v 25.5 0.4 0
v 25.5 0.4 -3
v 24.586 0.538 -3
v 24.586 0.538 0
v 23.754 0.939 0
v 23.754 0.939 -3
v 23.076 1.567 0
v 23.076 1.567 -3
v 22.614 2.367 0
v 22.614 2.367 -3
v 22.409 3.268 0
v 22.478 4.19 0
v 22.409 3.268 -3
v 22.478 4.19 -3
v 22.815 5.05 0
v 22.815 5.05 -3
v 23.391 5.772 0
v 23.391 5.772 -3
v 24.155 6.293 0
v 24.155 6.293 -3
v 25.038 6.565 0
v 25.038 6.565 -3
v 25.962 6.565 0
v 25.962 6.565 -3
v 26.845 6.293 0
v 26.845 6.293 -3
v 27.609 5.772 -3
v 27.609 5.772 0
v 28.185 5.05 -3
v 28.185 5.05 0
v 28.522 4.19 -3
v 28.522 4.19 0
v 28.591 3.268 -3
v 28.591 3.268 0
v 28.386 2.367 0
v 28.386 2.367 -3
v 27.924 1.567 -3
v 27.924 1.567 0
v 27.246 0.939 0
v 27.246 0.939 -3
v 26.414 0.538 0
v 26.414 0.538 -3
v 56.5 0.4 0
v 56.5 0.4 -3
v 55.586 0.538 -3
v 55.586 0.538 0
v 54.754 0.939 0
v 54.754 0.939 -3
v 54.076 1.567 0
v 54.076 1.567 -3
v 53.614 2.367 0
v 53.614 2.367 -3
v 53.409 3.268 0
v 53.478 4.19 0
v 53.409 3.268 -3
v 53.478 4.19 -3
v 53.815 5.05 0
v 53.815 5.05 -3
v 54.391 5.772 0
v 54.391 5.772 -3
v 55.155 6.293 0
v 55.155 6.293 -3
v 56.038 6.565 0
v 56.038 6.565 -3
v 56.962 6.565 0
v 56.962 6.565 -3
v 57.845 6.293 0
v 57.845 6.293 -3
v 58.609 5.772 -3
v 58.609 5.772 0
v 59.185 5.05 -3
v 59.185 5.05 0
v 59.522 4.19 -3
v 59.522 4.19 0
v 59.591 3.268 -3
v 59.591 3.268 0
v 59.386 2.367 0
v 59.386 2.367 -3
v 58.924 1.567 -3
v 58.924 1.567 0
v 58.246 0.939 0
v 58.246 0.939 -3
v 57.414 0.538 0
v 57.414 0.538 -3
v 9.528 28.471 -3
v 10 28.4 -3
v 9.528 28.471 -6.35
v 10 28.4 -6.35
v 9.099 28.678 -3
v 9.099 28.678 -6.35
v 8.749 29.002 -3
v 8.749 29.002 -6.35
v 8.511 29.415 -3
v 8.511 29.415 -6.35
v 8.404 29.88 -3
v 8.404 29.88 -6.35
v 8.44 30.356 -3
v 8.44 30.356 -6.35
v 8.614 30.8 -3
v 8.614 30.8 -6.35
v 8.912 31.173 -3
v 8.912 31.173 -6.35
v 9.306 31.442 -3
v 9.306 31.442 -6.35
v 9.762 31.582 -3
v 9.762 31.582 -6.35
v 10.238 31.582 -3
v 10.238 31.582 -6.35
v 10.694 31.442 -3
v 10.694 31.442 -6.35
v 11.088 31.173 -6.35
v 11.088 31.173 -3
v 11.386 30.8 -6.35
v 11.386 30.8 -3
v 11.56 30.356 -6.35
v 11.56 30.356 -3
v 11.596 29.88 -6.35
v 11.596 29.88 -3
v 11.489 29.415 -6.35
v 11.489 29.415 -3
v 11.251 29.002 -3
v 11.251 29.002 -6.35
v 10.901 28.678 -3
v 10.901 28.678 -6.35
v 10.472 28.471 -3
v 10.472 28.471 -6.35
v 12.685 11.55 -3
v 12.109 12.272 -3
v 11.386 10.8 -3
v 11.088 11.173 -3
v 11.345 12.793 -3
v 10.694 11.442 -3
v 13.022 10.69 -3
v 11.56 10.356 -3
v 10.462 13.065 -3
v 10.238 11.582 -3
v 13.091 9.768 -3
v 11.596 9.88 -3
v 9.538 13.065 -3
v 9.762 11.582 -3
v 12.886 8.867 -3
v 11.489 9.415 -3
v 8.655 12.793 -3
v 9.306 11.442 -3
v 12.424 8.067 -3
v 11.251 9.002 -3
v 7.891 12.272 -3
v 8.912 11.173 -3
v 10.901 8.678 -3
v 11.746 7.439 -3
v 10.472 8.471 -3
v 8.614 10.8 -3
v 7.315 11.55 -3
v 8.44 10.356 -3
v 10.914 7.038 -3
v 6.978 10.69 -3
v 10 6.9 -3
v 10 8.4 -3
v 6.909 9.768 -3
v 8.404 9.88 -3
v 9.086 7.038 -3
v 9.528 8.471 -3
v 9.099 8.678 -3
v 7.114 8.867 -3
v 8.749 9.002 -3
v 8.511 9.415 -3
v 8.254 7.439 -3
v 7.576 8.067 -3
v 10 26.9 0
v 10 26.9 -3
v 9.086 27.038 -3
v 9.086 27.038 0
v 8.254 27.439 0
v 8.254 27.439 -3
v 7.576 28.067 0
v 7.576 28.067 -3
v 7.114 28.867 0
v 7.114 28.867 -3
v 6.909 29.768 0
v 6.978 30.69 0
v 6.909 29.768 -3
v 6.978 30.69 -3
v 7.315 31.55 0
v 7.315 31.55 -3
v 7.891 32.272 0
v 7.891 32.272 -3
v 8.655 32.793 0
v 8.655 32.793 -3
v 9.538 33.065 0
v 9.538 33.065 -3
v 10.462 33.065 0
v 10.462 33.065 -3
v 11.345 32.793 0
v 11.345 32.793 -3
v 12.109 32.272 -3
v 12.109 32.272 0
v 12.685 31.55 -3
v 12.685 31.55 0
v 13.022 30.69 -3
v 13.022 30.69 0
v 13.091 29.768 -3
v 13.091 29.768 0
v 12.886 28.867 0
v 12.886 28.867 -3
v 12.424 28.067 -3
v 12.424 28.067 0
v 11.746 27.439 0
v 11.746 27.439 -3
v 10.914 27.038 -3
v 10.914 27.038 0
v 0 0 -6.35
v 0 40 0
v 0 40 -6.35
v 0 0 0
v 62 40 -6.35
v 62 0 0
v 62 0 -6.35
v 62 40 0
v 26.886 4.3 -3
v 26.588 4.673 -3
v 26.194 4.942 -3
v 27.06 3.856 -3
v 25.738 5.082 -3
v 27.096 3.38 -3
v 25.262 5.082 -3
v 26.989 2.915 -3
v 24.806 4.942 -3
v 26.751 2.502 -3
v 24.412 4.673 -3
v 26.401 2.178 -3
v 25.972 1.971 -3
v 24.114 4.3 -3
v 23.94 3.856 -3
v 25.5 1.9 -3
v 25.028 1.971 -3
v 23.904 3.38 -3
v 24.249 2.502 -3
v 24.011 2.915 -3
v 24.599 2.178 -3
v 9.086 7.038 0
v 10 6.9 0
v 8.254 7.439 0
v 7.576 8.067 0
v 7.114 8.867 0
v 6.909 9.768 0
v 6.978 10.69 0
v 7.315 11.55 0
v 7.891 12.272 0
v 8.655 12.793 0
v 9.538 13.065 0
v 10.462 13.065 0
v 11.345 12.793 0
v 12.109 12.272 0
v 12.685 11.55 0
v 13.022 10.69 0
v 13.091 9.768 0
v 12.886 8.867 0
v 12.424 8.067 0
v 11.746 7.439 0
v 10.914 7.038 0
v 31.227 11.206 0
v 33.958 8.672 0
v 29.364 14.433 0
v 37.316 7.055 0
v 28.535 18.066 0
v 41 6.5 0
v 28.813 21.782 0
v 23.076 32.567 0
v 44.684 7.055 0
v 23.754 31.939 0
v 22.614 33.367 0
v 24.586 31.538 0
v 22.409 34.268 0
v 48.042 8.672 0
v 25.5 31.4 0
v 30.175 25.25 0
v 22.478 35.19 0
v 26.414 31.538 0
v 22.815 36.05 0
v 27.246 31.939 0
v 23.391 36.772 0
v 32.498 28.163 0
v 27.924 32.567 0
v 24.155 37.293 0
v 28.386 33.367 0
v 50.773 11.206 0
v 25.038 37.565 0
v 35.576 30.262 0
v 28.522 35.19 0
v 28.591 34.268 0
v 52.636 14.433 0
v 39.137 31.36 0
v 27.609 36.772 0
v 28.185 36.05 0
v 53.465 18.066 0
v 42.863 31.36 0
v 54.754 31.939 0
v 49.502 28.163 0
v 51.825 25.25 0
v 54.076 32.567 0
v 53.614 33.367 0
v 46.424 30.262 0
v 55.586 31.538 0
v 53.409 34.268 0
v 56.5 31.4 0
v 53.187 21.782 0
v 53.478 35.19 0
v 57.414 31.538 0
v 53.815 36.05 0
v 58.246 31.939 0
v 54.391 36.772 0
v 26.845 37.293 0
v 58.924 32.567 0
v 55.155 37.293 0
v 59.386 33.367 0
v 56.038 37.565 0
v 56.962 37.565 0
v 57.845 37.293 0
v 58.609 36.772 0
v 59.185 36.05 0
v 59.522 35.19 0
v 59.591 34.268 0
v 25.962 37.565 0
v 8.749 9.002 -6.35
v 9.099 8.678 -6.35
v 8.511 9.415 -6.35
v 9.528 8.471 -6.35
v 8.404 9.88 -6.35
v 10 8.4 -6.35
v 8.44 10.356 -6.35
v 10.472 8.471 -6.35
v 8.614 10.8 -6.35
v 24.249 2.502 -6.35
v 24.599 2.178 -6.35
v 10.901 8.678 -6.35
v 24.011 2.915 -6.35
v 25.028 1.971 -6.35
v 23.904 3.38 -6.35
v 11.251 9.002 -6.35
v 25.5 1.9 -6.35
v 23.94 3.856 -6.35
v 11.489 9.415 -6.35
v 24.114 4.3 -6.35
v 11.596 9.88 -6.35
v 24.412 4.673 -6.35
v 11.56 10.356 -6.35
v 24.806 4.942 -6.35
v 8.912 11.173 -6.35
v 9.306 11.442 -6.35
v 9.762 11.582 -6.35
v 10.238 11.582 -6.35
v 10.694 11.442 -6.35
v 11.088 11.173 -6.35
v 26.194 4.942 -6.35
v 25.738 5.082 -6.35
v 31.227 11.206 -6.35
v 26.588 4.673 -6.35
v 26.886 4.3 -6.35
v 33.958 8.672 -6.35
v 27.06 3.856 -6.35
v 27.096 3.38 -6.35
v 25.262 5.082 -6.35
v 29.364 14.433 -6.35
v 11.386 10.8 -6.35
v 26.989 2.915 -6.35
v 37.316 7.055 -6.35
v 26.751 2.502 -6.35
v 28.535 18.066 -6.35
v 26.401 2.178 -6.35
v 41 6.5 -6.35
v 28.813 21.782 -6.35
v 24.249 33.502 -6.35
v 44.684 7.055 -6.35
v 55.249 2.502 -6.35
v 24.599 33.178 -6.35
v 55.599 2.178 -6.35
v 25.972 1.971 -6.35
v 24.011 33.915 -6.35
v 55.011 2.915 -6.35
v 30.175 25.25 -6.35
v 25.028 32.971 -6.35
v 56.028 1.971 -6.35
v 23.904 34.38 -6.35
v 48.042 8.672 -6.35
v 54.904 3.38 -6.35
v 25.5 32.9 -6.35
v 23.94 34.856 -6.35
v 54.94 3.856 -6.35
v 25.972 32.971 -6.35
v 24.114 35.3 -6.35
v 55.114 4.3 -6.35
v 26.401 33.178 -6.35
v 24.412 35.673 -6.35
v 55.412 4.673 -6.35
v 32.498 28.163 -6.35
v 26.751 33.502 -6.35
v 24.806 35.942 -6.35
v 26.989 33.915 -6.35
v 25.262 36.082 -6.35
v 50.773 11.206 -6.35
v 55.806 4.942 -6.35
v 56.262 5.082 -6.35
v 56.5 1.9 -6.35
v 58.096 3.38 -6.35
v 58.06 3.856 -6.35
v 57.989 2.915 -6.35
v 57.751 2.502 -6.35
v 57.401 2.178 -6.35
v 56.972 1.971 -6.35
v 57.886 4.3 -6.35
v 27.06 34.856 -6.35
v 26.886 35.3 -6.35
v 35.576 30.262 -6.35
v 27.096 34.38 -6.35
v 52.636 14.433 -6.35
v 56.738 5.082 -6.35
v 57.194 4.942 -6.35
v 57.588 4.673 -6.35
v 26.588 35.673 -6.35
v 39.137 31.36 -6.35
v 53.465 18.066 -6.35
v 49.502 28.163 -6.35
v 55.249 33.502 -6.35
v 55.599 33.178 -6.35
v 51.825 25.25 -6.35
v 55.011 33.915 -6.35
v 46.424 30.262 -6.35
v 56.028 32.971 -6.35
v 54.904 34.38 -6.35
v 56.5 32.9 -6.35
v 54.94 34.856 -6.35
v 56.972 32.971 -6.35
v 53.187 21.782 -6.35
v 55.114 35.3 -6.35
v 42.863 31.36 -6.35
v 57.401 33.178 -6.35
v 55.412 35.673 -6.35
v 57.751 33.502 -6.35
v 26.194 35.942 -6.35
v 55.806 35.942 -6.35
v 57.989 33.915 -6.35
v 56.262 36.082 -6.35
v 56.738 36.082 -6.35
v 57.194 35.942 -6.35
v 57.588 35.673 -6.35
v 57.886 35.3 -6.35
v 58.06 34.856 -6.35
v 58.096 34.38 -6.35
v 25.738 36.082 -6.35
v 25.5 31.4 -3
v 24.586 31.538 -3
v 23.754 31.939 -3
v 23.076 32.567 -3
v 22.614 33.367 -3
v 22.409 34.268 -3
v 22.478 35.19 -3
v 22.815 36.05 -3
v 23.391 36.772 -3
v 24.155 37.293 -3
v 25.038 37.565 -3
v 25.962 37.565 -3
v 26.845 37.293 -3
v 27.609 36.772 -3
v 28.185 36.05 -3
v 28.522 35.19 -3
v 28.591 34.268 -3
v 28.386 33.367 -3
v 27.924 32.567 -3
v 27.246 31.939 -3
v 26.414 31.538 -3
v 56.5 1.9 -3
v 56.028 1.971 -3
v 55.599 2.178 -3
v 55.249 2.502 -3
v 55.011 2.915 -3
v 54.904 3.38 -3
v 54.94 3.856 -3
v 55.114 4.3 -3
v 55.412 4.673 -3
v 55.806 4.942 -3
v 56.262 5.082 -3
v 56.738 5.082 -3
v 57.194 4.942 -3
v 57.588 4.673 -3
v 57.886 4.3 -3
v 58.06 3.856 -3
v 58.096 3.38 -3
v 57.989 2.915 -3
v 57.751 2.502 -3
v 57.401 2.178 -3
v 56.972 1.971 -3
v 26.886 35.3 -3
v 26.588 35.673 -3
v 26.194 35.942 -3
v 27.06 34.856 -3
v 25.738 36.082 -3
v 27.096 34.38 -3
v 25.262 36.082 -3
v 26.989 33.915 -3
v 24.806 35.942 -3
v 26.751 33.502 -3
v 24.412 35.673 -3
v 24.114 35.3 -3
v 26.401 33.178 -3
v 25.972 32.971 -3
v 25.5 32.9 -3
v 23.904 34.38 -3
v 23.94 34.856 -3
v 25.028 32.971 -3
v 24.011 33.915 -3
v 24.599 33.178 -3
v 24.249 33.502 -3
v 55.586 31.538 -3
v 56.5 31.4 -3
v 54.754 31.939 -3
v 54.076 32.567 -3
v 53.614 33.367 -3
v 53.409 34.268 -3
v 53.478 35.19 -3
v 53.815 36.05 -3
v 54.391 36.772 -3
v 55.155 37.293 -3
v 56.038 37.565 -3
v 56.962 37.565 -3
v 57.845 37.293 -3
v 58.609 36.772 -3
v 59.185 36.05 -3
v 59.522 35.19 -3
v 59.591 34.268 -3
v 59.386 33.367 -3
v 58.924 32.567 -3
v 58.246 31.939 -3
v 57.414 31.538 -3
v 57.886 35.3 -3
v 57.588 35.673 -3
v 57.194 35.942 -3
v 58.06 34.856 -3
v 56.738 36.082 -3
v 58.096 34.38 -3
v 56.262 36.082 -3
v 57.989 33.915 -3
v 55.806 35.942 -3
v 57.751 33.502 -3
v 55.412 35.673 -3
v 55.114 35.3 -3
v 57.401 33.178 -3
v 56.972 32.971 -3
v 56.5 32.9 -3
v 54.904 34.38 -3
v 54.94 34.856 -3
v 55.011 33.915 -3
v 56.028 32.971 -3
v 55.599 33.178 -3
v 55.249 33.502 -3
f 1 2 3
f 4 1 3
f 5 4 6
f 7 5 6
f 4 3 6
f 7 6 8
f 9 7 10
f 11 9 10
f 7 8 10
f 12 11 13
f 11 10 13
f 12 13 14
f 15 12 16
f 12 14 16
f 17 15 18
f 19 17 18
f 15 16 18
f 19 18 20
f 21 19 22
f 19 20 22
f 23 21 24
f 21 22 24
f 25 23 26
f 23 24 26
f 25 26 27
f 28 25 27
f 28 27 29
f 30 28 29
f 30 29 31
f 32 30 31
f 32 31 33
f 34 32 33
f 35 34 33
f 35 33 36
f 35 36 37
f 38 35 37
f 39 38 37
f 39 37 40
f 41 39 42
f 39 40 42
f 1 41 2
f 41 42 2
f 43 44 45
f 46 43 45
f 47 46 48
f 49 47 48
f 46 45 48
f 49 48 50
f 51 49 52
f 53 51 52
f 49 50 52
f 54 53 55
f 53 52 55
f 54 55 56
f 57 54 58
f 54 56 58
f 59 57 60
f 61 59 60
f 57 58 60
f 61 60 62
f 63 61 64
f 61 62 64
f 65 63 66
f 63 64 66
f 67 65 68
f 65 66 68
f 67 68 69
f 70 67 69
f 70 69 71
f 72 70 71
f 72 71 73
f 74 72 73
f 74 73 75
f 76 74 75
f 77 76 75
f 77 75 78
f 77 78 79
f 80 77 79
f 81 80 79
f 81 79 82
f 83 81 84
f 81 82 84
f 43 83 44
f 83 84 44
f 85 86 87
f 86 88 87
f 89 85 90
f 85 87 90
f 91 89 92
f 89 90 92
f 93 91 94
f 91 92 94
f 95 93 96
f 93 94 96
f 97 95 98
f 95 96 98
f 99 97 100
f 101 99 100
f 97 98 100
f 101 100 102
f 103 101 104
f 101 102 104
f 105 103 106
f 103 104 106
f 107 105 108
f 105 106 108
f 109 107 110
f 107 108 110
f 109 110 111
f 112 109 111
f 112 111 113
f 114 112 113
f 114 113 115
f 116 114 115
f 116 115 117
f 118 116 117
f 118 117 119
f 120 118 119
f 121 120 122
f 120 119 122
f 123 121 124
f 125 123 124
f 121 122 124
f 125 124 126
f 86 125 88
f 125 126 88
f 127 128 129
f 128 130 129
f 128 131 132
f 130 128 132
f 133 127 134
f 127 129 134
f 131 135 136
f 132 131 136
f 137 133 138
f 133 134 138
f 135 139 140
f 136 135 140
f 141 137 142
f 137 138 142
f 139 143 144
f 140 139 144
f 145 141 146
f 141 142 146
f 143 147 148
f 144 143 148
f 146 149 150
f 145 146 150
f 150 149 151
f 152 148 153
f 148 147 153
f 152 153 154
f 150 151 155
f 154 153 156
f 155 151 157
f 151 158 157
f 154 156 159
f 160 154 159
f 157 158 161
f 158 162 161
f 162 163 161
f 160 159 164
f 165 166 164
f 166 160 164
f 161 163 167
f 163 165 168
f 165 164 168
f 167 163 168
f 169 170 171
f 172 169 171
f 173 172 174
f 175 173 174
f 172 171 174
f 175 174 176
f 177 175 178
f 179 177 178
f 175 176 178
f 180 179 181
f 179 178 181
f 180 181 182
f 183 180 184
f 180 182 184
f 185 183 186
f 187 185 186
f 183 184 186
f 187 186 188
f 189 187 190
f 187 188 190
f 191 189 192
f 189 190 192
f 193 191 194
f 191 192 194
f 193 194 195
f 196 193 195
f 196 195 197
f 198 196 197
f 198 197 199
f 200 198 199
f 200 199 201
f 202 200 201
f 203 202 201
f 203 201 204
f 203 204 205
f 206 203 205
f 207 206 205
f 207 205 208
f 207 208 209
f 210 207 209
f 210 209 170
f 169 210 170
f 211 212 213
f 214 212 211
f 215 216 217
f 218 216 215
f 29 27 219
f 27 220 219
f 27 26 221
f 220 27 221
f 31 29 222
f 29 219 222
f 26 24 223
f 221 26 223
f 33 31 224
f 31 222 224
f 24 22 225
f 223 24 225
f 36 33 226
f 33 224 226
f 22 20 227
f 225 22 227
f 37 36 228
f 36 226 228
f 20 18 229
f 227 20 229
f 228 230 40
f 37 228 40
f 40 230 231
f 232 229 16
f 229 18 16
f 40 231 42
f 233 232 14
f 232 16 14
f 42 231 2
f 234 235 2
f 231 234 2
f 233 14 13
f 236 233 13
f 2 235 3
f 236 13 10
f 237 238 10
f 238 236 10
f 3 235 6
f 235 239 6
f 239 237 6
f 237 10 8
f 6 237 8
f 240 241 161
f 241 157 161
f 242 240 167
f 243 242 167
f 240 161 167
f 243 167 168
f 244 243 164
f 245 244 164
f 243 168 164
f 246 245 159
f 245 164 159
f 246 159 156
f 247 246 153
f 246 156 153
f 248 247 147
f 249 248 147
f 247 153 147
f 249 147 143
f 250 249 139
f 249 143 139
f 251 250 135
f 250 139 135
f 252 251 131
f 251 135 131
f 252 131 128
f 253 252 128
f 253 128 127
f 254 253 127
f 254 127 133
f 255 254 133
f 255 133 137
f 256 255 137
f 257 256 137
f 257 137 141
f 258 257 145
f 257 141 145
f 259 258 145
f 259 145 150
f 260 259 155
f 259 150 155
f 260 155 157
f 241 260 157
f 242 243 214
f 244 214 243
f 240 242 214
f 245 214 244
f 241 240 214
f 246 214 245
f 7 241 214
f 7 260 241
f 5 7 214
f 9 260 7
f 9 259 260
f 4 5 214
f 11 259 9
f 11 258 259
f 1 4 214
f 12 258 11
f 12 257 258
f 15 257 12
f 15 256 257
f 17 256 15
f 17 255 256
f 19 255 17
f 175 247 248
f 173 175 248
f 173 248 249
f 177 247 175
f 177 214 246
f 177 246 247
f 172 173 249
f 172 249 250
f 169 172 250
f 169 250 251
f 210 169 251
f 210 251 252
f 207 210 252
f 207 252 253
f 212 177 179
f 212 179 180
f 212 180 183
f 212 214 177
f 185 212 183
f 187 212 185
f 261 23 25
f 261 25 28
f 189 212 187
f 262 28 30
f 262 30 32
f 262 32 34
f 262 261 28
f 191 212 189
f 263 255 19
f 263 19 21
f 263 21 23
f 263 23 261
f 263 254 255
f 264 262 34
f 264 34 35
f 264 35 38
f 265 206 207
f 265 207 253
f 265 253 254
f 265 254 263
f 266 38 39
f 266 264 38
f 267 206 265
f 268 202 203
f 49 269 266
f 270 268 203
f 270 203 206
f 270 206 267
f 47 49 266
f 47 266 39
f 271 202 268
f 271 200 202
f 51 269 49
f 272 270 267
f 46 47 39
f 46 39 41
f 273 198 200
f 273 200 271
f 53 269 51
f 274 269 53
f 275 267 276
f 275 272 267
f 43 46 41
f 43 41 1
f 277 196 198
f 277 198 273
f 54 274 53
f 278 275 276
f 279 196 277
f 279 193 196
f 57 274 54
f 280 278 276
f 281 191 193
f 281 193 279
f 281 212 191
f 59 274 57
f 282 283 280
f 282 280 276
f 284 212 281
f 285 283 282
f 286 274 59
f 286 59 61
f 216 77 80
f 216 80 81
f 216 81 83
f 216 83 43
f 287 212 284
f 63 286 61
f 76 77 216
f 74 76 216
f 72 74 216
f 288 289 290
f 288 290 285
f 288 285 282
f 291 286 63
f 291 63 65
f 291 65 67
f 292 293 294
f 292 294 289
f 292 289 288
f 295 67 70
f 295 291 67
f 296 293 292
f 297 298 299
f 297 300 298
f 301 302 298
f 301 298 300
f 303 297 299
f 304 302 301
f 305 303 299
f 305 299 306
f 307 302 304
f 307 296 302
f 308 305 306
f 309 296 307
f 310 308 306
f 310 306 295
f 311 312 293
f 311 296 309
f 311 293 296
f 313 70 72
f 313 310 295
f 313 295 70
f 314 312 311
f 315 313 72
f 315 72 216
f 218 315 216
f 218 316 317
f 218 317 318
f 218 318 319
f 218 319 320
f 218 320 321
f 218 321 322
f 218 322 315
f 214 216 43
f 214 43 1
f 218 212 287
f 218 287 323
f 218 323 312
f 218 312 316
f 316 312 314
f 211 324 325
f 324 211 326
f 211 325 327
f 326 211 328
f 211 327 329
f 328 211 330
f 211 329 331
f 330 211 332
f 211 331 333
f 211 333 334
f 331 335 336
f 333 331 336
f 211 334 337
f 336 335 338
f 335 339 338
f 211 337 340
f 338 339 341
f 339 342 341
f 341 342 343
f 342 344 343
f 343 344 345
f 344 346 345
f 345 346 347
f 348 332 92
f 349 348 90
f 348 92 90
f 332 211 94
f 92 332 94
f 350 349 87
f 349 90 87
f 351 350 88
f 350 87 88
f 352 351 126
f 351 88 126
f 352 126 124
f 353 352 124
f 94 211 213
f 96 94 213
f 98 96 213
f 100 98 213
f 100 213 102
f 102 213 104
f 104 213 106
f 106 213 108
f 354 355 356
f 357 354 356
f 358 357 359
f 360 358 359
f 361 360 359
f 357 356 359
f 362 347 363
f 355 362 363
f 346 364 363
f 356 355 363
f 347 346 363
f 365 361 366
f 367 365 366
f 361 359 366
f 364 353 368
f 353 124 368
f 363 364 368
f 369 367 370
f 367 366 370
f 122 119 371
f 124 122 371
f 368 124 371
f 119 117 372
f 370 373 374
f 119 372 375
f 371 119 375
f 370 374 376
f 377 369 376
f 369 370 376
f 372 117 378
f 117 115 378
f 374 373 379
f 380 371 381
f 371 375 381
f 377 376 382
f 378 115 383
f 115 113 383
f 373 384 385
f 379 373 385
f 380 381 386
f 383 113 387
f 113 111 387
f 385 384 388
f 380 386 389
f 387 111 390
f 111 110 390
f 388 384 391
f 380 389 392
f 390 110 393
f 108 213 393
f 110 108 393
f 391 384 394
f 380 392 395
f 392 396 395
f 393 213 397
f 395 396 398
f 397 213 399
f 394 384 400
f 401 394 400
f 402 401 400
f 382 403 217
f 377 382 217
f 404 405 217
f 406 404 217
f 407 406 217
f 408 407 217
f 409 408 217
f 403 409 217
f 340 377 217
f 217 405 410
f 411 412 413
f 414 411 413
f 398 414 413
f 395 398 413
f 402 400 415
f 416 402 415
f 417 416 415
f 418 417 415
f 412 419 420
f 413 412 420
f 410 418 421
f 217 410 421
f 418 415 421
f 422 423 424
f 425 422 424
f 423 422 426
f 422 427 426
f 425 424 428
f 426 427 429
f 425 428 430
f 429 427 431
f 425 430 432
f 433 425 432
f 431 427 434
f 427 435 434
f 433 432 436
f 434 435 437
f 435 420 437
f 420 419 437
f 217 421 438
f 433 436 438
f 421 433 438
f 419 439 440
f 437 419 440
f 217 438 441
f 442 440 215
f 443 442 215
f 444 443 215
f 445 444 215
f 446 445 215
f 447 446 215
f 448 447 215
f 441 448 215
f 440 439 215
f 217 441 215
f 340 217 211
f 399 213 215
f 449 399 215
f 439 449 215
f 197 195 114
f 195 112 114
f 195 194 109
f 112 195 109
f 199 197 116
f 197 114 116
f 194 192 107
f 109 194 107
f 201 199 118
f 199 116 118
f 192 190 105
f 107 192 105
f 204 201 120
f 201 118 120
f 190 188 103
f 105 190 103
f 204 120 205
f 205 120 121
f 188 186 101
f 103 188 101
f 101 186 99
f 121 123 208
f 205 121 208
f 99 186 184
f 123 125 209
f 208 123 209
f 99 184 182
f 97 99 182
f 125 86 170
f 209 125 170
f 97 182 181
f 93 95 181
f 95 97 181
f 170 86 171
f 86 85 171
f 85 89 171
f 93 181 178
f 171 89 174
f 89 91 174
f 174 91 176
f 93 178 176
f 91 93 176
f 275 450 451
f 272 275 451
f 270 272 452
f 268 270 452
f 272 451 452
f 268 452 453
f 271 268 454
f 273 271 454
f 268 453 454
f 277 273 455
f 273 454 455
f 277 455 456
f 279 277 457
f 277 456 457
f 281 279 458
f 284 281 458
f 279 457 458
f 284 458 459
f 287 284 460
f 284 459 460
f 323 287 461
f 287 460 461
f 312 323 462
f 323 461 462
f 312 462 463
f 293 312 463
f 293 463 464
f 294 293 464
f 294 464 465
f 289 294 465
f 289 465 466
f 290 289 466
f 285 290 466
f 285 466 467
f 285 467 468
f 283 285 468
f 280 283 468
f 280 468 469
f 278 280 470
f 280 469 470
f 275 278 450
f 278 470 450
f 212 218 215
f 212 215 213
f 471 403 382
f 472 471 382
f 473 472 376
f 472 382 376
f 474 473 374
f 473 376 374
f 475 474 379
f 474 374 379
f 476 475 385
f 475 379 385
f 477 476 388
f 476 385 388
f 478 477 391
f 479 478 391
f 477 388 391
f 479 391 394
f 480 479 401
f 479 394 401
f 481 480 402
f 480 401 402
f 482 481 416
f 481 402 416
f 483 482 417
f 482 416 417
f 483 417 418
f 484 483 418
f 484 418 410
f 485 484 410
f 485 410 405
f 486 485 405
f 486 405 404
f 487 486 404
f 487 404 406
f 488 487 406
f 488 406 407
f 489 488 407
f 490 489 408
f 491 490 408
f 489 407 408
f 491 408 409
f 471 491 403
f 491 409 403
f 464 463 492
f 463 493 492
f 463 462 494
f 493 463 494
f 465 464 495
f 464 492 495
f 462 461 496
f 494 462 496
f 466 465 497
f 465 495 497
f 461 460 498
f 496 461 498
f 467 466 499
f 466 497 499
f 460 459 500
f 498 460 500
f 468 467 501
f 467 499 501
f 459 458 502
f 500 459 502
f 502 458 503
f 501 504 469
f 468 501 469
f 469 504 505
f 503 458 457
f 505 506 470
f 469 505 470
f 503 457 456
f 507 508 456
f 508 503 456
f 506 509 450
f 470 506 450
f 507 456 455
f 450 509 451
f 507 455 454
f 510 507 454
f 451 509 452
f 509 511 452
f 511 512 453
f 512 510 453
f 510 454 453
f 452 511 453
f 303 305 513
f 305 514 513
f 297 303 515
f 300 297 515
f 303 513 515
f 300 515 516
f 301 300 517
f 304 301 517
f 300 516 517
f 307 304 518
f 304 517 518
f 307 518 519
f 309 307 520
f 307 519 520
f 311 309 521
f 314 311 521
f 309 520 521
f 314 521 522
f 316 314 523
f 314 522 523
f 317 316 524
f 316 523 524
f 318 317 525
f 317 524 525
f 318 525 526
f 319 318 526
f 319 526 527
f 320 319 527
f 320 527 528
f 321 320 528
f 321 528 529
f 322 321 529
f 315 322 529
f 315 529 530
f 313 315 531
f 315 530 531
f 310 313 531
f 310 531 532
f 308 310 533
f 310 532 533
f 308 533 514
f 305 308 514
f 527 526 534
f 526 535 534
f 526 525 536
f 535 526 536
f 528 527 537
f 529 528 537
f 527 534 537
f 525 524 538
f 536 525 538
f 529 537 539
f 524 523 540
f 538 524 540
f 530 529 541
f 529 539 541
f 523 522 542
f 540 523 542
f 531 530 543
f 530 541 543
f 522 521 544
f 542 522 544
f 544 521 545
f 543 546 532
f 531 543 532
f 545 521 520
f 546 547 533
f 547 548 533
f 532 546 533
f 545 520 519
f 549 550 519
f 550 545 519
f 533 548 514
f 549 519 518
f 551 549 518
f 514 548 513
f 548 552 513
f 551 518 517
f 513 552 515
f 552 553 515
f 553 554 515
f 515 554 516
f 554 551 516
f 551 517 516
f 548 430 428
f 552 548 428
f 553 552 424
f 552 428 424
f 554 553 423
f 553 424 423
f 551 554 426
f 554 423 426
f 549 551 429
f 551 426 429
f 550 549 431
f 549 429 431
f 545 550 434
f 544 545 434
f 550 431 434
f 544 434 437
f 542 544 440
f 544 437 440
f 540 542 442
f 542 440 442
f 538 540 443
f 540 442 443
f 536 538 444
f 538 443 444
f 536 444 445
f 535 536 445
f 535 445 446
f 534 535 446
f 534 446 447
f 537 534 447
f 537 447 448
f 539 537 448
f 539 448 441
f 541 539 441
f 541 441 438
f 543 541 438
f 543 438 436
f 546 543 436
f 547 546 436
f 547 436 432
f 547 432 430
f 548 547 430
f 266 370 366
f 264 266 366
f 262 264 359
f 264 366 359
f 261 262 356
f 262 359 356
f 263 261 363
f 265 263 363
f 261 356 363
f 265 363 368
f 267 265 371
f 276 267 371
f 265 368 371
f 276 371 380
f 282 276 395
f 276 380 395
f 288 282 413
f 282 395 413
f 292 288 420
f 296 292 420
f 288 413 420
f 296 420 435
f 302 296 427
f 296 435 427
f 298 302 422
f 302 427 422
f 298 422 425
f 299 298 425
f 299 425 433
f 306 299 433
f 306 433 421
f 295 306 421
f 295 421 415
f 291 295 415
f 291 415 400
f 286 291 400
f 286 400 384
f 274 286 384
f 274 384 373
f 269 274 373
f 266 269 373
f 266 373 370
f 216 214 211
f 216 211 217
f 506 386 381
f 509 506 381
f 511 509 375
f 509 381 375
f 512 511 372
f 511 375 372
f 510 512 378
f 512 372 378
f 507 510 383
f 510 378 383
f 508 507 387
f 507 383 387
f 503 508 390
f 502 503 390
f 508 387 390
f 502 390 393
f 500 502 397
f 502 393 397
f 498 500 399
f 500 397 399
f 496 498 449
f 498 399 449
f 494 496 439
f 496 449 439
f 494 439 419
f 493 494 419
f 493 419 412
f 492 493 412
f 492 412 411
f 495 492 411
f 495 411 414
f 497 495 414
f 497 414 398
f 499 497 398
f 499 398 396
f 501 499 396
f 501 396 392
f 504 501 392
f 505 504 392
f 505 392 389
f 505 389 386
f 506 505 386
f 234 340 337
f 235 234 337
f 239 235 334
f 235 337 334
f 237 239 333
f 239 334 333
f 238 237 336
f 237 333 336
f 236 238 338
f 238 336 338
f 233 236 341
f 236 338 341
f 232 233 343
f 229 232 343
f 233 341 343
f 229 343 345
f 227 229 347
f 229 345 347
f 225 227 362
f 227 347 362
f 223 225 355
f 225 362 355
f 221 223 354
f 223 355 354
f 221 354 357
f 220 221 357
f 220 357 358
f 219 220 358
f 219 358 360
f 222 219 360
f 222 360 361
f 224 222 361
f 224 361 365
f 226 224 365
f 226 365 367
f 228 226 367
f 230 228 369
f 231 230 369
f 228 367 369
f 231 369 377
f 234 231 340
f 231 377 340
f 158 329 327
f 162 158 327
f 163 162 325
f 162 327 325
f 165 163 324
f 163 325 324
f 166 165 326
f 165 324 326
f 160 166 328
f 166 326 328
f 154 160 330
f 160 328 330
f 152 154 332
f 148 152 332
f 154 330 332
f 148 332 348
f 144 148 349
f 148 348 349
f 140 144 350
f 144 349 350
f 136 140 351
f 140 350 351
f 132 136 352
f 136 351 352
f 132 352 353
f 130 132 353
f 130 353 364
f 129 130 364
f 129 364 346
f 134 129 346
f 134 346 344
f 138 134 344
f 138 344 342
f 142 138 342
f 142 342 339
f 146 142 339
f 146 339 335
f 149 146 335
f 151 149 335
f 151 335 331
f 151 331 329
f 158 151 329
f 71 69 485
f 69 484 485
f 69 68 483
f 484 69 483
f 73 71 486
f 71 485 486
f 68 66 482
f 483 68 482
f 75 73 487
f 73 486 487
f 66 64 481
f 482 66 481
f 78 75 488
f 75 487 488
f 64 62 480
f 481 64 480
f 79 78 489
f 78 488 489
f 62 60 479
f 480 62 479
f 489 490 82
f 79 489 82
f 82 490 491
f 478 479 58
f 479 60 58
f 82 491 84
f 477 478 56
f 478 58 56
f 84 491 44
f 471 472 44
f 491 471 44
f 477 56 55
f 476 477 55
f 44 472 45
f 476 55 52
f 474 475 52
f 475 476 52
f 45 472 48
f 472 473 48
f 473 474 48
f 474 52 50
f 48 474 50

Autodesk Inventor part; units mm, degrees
ref_plane "YZ Plane" through (0, 0, 0) normal (1, 0, 0) x (0, 1, 0)
ref_plane "XZ Plane" through (0, 0, 0) normal (0, 1, 0) x (-1, 0, 0)
ref_plane "XY Plane" through (0, 0, 0) normal (0, 0, 1) x (1, 0, 0)
sketch "Sketch1" plane through (0, 0, 0) normal (0, 0, 1) x (1, 0, 0)
  line L0 (0, 0) -> (62, 0)
  line L1 (62, 0) -> (62, 40)
  line L2 (62, 40) -> (0, 40)
  line L3 (0, 40) -> (0, 0)
  line L4 (20, 40) -> (62, 40) construction
  line L5 (62, 40) -> (62, -2) construction
  line L6 (62, -2) -> (20, -2) construction
  line L7 (20, -2) -> (20, 40) construction
  line L8 (25.5, 34.5) -> (56.5, 34.5) construction
  line L9 (56.5, 34.5) -> (56.5, 3.5) construction
  line L10 (56.5, 3.5) -> (25.5, 3.5) construction
  line L11 (25.5, 3.5) -> (25.5, 34.5) construction
  point P0 (25.5, 19)
  point P1 (20, 19)
  point P2 (41, 34.5)
  point P3 (41, 40)
  point P4 (41, 19)
  point P5 (10, 30)
  point P6 (10, 10)
  dimension "d0" = 40
  dimension "d1" = 62
  dimension "d2" = 42
  dimension "d3" = 42
  dimension "d4" = 31
  dimension "d5" = 31
  dimension "d22" = 10
  dimension "d23" = 10
  dimension "d24" = 10
extrude "Extrusion1" add sketch "Sketch1" against normal blind 6.35
hole "Hole1" at (25.5, 34.5, 0) at (56.5, 34.5, 0) at (56.5, 3.5, 0) at (25.5, 3.5, 0) at (10, 30, 0) at (10, 10, 0) direction (0, 0, -1) diameter 3.2 end through all counterbore diameter 6.2 counterbore depth 3
hole "Hole2" at (41, 19, 0) direction (0, 0, -1) diameter 25 end through all
properties part number "Y Motor Mount"
